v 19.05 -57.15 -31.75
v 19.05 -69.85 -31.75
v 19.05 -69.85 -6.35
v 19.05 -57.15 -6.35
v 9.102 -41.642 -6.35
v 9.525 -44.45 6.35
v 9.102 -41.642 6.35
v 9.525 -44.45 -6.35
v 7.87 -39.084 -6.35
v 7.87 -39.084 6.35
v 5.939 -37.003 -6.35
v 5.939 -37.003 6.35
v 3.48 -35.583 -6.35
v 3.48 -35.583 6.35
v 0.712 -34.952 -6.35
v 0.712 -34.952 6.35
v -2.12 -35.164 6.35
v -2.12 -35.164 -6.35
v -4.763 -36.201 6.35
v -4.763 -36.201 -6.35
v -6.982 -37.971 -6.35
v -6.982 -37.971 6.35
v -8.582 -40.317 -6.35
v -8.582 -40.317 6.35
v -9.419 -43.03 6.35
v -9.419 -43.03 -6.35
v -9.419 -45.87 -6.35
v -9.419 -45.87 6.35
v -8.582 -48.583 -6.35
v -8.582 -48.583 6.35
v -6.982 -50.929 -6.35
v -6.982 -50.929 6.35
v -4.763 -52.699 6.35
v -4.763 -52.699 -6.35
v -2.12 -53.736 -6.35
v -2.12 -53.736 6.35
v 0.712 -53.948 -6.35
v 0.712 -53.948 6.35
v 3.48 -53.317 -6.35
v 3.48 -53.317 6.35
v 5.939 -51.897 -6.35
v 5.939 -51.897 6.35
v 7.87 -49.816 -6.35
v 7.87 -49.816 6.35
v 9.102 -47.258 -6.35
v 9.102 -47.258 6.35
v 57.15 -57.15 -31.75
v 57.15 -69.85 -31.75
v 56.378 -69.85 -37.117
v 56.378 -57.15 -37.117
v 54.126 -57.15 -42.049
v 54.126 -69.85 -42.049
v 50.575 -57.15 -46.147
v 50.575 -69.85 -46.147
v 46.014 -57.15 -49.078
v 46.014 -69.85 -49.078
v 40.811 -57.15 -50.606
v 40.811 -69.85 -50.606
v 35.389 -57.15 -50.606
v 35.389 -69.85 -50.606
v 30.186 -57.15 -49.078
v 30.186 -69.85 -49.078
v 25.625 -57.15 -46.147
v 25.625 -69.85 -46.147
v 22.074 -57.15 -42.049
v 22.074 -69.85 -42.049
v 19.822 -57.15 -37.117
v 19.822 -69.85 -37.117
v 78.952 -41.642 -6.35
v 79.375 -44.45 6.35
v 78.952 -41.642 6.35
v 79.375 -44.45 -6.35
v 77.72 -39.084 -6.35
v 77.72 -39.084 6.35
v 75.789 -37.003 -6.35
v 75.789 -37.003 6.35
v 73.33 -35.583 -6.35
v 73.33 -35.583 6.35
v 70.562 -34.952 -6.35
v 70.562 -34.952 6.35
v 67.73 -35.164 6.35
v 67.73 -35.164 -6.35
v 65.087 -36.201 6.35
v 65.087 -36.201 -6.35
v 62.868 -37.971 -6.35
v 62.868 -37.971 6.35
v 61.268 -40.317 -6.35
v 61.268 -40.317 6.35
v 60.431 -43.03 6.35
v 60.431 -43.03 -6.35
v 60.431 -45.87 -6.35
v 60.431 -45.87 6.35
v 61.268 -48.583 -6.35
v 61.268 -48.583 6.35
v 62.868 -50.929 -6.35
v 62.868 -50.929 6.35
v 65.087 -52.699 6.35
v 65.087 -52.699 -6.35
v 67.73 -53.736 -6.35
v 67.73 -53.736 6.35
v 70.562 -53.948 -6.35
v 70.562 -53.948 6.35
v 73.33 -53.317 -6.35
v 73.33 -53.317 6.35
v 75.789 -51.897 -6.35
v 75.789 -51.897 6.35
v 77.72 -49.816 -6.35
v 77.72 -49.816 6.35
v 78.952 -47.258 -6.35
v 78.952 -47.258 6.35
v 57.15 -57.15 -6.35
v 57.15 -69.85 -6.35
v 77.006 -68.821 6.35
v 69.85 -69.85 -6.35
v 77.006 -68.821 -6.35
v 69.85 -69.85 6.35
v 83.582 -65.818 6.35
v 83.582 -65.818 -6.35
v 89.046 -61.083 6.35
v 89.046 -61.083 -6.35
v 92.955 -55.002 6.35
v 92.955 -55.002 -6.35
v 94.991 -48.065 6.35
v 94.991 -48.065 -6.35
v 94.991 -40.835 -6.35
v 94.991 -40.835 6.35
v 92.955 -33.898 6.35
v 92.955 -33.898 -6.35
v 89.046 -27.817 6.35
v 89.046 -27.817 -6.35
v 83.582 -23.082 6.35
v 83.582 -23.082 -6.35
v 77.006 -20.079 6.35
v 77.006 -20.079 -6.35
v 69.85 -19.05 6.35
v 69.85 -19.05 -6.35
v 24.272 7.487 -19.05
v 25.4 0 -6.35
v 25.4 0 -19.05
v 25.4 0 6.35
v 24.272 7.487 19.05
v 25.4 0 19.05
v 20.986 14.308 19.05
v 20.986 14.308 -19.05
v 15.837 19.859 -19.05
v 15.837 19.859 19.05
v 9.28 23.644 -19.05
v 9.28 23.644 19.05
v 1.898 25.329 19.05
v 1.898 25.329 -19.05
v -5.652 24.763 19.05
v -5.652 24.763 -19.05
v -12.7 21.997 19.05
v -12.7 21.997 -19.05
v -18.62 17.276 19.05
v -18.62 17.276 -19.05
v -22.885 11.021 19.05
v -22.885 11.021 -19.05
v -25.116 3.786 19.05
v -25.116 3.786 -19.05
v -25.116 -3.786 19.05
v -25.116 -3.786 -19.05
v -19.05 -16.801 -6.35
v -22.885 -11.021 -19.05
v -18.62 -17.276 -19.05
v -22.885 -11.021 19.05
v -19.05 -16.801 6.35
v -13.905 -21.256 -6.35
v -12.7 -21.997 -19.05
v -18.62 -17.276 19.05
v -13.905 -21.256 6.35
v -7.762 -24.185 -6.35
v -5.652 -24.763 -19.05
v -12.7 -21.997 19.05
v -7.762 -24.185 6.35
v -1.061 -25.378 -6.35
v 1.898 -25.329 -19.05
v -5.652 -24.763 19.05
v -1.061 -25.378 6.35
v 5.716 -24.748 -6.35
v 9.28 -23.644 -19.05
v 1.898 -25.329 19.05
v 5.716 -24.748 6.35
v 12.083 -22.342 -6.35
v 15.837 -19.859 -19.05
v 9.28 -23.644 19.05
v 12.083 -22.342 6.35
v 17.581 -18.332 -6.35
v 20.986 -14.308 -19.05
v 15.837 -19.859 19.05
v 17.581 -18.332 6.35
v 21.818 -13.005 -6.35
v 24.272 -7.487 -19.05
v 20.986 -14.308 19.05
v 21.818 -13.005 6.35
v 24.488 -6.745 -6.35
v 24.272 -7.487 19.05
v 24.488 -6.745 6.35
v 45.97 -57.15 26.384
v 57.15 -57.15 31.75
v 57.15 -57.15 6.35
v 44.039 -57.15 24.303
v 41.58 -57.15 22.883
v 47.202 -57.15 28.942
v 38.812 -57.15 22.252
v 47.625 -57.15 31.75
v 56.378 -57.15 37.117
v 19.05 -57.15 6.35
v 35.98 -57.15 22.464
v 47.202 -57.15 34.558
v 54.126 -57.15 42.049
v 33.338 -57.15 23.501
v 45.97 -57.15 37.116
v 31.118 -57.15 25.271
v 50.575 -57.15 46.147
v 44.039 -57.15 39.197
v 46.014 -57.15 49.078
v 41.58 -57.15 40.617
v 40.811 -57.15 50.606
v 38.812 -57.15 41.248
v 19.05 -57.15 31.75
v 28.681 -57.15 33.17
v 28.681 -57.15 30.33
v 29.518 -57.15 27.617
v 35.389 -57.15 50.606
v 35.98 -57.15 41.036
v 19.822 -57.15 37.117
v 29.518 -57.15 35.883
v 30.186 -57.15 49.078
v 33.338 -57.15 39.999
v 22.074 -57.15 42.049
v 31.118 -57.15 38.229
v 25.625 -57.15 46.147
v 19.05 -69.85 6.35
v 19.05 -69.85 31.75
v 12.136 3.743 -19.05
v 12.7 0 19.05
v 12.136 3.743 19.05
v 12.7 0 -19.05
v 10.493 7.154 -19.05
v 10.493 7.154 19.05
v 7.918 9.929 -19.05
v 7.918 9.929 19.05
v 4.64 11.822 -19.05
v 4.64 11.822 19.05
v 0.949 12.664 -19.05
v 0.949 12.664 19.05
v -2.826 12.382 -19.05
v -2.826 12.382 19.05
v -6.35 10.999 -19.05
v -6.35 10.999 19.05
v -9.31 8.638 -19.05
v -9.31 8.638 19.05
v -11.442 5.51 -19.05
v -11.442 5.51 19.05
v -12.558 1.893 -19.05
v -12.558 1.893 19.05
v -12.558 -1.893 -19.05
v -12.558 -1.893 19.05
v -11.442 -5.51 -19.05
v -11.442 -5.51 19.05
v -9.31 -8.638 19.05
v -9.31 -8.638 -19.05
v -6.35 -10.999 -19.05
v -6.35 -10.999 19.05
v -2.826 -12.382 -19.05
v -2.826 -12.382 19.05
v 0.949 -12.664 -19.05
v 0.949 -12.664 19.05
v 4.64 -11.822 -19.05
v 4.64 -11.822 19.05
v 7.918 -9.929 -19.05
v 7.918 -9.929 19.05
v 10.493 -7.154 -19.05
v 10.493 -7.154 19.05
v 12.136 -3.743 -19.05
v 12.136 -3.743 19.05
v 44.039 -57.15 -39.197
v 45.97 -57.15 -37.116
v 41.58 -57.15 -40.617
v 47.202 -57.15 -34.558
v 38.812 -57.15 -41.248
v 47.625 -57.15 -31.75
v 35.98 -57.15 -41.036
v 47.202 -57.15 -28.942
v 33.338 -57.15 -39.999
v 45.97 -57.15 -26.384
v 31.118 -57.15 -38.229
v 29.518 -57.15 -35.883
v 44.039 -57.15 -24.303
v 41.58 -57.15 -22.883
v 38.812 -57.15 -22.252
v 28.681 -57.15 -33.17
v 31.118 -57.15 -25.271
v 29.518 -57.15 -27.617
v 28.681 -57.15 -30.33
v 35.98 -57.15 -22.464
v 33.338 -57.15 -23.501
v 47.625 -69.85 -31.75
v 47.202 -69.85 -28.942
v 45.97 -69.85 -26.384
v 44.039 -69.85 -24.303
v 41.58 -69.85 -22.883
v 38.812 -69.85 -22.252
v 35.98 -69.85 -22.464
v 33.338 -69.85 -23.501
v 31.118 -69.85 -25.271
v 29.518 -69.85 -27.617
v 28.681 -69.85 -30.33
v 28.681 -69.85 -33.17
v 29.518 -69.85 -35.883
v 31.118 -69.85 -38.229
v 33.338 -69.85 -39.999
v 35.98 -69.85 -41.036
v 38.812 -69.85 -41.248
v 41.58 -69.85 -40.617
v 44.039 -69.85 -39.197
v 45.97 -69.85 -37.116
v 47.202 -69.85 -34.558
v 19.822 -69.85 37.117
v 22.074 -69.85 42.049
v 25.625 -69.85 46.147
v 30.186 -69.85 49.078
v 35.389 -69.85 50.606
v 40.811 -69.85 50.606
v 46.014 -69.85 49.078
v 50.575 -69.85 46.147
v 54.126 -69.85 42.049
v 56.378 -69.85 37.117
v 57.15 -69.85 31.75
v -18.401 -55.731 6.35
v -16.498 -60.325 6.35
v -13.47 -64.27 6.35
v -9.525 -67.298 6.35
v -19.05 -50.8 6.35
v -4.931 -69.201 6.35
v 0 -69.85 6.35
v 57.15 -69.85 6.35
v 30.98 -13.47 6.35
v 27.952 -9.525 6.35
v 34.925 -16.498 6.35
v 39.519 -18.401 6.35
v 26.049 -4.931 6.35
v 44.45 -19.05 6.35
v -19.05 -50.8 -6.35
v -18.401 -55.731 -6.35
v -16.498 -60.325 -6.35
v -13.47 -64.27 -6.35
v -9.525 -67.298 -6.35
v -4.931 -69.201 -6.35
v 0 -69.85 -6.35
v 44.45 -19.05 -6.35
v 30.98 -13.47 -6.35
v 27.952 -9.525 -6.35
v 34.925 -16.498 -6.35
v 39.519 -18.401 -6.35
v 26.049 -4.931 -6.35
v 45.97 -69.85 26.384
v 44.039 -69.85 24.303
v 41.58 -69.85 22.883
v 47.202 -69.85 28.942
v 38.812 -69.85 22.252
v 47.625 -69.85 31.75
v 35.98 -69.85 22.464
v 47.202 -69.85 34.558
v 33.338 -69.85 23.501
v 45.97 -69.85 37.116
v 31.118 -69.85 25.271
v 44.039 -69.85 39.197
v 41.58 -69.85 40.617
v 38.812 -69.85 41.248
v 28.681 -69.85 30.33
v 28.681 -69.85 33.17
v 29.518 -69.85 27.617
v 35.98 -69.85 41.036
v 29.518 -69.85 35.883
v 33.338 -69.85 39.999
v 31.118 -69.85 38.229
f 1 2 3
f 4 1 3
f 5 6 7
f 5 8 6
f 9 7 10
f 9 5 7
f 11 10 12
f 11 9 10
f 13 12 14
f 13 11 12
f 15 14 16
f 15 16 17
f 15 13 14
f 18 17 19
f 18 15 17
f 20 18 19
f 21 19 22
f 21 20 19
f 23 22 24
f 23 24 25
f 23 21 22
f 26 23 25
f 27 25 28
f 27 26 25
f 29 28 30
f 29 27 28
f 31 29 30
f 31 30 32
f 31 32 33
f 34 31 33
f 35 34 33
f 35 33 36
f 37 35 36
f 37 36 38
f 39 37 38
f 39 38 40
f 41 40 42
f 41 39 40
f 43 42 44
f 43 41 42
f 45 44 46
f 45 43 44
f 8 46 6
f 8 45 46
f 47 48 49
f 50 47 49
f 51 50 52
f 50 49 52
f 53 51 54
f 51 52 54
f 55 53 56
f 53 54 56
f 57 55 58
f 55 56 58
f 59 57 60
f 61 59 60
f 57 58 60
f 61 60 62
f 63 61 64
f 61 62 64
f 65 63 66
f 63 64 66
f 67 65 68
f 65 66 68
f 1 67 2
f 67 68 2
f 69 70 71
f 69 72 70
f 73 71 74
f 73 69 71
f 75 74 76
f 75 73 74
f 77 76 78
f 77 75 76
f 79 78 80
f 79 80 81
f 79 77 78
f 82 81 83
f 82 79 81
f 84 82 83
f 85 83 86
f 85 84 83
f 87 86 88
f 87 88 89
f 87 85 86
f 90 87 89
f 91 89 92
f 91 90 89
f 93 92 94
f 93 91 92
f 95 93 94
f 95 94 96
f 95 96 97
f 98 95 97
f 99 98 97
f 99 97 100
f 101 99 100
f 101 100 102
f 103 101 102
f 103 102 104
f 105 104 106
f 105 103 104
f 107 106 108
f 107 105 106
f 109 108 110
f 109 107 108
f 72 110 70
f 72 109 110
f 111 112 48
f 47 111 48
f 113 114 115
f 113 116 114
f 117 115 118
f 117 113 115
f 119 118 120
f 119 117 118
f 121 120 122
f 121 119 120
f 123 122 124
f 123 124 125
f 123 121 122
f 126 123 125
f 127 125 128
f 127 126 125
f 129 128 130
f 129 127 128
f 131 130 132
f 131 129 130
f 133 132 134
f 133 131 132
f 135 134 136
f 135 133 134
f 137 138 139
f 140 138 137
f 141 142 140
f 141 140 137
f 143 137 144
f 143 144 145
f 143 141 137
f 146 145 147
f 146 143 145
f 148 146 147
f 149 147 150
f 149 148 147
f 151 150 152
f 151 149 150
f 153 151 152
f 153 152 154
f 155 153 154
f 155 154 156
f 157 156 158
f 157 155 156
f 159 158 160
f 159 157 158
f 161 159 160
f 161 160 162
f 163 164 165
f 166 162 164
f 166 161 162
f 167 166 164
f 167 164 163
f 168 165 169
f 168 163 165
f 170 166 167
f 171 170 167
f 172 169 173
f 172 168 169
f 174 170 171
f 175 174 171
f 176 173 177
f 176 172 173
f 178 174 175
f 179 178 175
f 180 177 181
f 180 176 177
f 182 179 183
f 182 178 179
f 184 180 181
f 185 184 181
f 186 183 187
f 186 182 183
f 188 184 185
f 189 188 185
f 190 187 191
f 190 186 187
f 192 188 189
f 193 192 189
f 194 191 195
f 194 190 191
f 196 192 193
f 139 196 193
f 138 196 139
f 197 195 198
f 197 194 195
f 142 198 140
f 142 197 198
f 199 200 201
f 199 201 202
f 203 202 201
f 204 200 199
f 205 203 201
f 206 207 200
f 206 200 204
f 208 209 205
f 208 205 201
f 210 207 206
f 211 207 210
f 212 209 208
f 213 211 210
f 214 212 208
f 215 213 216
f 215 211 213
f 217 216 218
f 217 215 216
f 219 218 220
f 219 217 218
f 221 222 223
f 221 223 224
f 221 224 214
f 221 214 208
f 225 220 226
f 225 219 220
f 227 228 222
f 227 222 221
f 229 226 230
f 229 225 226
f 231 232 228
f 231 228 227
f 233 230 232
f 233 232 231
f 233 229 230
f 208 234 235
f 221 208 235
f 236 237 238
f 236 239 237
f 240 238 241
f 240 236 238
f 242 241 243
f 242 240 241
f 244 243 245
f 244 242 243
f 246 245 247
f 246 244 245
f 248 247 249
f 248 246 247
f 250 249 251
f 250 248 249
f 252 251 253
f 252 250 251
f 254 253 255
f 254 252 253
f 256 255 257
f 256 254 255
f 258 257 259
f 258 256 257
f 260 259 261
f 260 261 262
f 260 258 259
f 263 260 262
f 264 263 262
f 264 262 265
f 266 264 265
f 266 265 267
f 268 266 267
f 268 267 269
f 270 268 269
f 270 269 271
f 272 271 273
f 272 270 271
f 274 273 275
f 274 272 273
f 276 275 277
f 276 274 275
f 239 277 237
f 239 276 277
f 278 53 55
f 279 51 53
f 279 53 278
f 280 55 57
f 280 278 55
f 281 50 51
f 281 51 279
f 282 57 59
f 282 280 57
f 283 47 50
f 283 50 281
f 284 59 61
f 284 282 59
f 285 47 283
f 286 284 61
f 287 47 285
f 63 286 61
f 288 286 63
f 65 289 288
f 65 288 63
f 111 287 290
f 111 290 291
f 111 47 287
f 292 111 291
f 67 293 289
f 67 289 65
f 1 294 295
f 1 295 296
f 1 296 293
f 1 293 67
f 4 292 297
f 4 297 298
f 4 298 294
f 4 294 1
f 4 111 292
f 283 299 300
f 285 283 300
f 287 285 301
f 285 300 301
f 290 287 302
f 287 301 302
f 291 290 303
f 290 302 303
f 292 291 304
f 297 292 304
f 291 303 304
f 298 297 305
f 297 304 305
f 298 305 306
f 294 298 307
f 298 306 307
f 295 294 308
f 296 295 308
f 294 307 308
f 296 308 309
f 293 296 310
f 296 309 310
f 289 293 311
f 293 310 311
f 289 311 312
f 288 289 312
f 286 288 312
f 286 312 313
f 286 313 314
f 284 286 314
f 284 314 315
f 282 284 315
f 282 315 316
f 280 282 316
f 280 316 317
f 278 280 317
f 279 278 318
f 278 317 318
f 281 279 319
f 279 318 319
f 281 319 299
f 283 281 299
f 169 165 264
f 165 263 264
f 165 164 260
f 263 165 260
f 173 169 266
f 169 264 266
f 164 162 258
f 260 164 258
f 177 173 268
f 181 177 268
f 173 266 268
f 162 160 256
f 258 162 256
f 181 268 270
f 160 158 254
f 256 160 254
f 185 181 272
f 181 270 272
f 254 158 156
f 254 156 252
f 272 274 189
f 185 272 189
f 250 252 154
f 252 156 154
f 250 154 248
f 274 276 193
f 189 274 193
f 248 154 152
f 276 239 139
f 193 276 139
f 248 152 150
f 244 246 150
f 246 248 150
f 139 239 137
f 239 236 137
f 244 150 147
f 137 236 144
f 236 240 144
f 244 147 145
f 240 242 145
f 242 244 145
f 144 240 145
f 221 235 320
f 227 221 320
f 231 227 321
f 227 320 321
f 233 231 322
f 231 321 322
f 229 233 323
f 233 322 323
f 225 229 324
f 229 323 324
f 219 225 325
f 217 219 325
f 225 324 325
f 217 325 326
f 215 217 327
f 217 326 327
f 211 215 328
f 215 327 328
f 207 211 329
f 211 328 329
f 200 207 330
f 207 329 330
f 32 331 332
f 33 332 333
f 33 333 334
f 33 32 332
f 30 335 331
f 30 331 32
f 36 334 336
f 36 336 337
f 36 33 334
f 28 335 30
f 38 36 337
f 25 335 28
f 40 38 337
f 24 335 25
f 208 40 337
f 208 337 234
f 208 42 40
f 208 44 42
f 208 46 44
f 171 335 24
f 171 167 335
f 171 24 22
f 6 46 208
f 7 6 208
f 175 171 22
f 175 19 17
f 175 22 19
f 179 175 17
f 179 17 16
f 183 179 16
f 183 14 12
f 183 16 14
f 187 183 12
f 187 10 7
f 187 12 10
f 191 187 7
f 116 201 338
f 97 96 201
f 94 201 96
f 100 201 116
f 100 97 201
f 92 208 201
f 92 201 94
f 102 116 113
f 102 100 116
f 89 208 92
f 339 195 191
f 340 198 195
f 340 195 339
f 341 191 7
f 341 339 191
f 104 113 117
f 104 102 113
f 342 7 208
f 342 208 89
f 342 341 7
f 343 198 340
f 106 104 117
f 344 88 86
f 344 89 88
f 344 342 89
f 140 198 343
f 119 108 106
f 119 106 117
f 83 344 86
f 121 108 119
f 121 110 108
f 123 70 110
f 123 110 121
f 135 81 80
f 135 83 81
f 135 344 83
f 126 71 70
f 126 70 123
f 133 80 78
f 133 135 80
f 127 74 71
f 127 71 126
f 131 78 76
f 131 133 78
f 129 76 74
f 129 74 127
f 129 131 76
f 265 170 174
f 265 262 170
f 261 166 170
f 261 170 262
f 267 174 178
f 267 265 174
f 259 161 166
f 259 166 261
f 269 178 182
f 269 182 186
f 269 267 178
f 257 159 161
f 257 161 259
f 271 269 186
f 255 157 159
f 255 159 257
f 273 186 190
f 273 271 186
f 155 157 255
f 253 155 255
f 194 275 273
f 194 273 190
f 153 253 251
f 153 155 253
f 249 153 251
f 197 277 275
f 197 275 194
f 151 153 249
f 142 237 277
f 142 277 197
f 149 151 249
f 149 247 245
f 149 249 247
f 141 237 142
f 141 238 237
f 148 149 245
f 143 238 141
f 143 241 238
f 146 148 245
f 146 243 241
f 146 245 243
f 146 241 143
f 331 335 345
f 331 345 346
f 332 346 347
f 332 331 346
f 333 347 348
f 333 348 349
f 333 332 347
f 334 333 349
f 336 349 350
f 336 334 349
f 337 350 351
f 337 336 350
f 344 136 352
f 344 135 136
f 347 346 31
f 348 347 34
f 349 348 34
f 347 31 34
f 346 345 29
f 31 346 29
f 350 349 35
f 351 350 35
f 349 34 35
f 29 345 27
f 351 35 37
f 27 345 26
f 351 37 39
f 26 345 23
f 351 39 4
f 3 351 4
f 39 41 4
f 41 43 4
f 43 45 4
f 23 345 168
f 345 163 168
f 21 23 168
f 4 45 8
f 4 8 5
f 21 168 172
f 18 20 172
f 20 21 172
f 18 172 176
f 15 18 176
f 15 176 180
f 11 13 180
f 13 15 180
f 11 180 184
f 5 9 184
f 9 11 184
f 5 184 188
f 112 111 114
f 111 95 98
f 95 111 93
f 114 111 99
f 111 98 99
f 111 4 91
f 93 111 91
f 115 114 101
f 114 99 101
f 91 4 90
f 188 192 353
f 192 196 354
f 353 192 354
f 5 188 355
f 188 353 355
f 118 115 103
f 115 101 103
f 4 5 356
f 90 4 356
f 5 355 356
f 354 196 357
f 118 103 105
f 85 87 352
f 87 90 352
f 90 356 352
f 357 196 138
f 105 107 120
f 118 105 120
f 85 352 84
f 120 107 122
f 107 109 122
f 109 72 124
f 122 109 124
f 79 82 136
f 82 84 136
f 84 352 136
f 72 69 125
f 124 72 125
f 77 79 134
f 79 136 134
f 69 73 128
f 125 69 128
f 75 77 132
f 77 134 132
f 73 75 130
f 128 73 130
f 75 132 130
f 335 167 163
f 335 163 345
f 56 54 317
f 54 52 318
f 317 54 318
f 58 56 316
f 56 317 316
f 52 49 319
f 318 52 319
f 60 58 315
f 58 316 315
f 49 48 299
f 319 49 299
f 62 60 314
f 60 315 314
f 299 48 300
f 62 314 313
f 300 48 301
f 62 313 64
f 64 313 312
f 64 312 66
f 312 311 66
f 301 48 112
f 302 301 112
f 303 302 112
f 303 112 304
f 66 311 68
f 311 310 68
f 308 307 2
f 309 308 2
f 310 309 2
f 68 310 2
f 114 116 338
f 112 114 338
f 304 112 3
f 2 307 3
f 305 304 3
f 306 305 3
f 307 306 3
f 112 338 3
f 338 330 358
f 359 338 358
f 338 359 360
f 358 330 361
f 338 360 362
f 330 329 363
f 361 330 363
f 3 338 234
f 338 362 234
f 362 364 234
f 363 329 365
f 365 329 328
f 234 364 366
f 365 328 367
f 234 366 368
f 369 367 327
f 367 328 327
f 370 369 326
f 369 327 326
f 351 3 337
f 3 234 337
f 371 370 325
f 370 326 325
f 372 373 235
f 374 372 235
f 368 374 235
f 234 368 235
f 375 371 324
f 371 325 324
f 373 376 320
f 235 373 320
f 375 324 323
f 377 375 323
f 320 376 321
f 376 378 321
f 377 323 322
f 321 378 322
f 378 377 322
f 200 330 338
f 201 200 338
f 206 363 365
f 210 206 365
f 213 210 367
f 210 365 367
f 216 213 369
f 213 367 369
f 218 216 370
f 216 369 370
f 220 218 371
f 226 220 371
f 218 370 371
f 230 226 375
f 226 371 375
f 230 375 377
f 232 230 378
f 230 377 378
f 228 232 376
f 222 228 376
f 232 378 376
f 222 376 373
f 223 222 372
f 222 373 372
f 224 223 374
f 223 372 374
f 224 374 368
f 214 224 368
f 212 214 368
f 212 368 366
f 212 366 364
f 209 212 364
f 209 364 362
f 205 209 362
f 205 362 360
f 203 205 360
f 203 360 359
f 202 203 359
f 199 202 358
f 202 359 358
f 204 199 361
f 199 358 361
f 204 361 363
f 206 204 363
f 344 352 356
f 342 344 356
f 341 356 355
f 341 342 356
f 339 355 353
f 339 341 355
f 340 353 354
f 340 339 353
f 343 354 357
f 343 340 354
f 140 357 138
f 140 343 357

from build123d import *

# Parameters (mm, degrees)
SKETCH2_R           = 9.524999999999999
SKETCH2_R_2         = 9.524999999999993
BOSS_EXTRUDE1_DEPTH = 6.35
SKETCH2_3_R         = 12.7
BOSS_EXTRUDE2_DEPTH = 19.05
SKETCH3_R           = 9.525
BOSS_EXTRUDE3_DEPTH = 12.7


with BuildPart() as part:
    # Sketch2 → Boss-Extrude1 (new, symmetric)
    with BuildSketch(Plane.XY):
        with BuildLine():
            ThreePointArc((25.4, -6.22e-15), (8.980256121069143, -23.75952440601453), (-19.05000000000001, -16.80052082526014))
            Line((-19.050000000000008, -16.80052082526014), (-19.050000000000004, -50.799999999999855))
            ThreePointArc((-19.050000000000004, -50.79999999999986), (-13.470384181603738, -64.27038418160373), (1.3351e-13, -69.85))
            Line((1.3531e-13, -69.85), (69.85, -69.85))
            ThreePointArc((69.84999999999998, -69.85), (95.25, -44.45), (69.85, -19.05))
            Line((69.85, -19.049999999999997), (44.45, -19.049999999999997))
            ThreePointArc((44.45, -19.05), (30.979615818396276, -13.470384181603727), (25.4, 3.1e-16))
        make_face()
        with Locations((0, -44.449999999999996)):
            Circle(SKETCH2_R, mode=Mode.SUBTRACT)
        with Locations((69.85, -44.449999999999996)):
            Circle(SKETCH2_R_2, mode=Mode.SUBTRACT)
    extrude(amount=BOSS_EXTRUDE1_DEPTH, both=True)

    # Sketch2<3> → Boss-Extrude2 (add, symmetric)
    with BuildSketch(Plane.XY):
        with BuildLine():
            ThreePointArc((25.4, 0), (-8.980256121069145, 23.759524406014528), (-19.05000000000001, -16.80052082526014))
            ThreePointArc((-19.05000000000001, -16.80052082526014), (8.980256121069143, -23.75952440601453), (25.4, -6.22e-15))
        make_face()
        Circle(SKETCH2_3_R, mode=Mode.SUBTRACT)
    extrude(amount=BOSS_EXTRUDE2_DEPTH, both=True)

    # Sketch3 → Boss-Extrude3 (add)
    with BuildSketch(Plane.XZ.offset(69.85)):
        with BuildLine():
            Line((19.050000000000008, -31.75), (19.050000000000008, 31.75))
            ThreePointArc((19.050000000000008, 31.75), (38.10000000000001, 50.79999999999998), (57.14999999999999, 31.75))
            Line((57.14999999999999, 31.75), (57.14999999999999, -31.75))
            ThreePointArc((57.14999999999999, -31.75), (38.10000000000001, -50.8), (19.050000000000008, -31.75))
        make_face()
        with Locations((38.10000000000001, 31.75)):
            Circle(SKETCH3_R, mode=Mode.SUBTRACT)
        with Locations((38.10000000000001, -31.75)):
            Circle(SKETCH3_R, mode=Mode.SUBTRACT)
    extrude(amount=-BOSS_EXTRUDE3_DEPTH)


solid = part.part
